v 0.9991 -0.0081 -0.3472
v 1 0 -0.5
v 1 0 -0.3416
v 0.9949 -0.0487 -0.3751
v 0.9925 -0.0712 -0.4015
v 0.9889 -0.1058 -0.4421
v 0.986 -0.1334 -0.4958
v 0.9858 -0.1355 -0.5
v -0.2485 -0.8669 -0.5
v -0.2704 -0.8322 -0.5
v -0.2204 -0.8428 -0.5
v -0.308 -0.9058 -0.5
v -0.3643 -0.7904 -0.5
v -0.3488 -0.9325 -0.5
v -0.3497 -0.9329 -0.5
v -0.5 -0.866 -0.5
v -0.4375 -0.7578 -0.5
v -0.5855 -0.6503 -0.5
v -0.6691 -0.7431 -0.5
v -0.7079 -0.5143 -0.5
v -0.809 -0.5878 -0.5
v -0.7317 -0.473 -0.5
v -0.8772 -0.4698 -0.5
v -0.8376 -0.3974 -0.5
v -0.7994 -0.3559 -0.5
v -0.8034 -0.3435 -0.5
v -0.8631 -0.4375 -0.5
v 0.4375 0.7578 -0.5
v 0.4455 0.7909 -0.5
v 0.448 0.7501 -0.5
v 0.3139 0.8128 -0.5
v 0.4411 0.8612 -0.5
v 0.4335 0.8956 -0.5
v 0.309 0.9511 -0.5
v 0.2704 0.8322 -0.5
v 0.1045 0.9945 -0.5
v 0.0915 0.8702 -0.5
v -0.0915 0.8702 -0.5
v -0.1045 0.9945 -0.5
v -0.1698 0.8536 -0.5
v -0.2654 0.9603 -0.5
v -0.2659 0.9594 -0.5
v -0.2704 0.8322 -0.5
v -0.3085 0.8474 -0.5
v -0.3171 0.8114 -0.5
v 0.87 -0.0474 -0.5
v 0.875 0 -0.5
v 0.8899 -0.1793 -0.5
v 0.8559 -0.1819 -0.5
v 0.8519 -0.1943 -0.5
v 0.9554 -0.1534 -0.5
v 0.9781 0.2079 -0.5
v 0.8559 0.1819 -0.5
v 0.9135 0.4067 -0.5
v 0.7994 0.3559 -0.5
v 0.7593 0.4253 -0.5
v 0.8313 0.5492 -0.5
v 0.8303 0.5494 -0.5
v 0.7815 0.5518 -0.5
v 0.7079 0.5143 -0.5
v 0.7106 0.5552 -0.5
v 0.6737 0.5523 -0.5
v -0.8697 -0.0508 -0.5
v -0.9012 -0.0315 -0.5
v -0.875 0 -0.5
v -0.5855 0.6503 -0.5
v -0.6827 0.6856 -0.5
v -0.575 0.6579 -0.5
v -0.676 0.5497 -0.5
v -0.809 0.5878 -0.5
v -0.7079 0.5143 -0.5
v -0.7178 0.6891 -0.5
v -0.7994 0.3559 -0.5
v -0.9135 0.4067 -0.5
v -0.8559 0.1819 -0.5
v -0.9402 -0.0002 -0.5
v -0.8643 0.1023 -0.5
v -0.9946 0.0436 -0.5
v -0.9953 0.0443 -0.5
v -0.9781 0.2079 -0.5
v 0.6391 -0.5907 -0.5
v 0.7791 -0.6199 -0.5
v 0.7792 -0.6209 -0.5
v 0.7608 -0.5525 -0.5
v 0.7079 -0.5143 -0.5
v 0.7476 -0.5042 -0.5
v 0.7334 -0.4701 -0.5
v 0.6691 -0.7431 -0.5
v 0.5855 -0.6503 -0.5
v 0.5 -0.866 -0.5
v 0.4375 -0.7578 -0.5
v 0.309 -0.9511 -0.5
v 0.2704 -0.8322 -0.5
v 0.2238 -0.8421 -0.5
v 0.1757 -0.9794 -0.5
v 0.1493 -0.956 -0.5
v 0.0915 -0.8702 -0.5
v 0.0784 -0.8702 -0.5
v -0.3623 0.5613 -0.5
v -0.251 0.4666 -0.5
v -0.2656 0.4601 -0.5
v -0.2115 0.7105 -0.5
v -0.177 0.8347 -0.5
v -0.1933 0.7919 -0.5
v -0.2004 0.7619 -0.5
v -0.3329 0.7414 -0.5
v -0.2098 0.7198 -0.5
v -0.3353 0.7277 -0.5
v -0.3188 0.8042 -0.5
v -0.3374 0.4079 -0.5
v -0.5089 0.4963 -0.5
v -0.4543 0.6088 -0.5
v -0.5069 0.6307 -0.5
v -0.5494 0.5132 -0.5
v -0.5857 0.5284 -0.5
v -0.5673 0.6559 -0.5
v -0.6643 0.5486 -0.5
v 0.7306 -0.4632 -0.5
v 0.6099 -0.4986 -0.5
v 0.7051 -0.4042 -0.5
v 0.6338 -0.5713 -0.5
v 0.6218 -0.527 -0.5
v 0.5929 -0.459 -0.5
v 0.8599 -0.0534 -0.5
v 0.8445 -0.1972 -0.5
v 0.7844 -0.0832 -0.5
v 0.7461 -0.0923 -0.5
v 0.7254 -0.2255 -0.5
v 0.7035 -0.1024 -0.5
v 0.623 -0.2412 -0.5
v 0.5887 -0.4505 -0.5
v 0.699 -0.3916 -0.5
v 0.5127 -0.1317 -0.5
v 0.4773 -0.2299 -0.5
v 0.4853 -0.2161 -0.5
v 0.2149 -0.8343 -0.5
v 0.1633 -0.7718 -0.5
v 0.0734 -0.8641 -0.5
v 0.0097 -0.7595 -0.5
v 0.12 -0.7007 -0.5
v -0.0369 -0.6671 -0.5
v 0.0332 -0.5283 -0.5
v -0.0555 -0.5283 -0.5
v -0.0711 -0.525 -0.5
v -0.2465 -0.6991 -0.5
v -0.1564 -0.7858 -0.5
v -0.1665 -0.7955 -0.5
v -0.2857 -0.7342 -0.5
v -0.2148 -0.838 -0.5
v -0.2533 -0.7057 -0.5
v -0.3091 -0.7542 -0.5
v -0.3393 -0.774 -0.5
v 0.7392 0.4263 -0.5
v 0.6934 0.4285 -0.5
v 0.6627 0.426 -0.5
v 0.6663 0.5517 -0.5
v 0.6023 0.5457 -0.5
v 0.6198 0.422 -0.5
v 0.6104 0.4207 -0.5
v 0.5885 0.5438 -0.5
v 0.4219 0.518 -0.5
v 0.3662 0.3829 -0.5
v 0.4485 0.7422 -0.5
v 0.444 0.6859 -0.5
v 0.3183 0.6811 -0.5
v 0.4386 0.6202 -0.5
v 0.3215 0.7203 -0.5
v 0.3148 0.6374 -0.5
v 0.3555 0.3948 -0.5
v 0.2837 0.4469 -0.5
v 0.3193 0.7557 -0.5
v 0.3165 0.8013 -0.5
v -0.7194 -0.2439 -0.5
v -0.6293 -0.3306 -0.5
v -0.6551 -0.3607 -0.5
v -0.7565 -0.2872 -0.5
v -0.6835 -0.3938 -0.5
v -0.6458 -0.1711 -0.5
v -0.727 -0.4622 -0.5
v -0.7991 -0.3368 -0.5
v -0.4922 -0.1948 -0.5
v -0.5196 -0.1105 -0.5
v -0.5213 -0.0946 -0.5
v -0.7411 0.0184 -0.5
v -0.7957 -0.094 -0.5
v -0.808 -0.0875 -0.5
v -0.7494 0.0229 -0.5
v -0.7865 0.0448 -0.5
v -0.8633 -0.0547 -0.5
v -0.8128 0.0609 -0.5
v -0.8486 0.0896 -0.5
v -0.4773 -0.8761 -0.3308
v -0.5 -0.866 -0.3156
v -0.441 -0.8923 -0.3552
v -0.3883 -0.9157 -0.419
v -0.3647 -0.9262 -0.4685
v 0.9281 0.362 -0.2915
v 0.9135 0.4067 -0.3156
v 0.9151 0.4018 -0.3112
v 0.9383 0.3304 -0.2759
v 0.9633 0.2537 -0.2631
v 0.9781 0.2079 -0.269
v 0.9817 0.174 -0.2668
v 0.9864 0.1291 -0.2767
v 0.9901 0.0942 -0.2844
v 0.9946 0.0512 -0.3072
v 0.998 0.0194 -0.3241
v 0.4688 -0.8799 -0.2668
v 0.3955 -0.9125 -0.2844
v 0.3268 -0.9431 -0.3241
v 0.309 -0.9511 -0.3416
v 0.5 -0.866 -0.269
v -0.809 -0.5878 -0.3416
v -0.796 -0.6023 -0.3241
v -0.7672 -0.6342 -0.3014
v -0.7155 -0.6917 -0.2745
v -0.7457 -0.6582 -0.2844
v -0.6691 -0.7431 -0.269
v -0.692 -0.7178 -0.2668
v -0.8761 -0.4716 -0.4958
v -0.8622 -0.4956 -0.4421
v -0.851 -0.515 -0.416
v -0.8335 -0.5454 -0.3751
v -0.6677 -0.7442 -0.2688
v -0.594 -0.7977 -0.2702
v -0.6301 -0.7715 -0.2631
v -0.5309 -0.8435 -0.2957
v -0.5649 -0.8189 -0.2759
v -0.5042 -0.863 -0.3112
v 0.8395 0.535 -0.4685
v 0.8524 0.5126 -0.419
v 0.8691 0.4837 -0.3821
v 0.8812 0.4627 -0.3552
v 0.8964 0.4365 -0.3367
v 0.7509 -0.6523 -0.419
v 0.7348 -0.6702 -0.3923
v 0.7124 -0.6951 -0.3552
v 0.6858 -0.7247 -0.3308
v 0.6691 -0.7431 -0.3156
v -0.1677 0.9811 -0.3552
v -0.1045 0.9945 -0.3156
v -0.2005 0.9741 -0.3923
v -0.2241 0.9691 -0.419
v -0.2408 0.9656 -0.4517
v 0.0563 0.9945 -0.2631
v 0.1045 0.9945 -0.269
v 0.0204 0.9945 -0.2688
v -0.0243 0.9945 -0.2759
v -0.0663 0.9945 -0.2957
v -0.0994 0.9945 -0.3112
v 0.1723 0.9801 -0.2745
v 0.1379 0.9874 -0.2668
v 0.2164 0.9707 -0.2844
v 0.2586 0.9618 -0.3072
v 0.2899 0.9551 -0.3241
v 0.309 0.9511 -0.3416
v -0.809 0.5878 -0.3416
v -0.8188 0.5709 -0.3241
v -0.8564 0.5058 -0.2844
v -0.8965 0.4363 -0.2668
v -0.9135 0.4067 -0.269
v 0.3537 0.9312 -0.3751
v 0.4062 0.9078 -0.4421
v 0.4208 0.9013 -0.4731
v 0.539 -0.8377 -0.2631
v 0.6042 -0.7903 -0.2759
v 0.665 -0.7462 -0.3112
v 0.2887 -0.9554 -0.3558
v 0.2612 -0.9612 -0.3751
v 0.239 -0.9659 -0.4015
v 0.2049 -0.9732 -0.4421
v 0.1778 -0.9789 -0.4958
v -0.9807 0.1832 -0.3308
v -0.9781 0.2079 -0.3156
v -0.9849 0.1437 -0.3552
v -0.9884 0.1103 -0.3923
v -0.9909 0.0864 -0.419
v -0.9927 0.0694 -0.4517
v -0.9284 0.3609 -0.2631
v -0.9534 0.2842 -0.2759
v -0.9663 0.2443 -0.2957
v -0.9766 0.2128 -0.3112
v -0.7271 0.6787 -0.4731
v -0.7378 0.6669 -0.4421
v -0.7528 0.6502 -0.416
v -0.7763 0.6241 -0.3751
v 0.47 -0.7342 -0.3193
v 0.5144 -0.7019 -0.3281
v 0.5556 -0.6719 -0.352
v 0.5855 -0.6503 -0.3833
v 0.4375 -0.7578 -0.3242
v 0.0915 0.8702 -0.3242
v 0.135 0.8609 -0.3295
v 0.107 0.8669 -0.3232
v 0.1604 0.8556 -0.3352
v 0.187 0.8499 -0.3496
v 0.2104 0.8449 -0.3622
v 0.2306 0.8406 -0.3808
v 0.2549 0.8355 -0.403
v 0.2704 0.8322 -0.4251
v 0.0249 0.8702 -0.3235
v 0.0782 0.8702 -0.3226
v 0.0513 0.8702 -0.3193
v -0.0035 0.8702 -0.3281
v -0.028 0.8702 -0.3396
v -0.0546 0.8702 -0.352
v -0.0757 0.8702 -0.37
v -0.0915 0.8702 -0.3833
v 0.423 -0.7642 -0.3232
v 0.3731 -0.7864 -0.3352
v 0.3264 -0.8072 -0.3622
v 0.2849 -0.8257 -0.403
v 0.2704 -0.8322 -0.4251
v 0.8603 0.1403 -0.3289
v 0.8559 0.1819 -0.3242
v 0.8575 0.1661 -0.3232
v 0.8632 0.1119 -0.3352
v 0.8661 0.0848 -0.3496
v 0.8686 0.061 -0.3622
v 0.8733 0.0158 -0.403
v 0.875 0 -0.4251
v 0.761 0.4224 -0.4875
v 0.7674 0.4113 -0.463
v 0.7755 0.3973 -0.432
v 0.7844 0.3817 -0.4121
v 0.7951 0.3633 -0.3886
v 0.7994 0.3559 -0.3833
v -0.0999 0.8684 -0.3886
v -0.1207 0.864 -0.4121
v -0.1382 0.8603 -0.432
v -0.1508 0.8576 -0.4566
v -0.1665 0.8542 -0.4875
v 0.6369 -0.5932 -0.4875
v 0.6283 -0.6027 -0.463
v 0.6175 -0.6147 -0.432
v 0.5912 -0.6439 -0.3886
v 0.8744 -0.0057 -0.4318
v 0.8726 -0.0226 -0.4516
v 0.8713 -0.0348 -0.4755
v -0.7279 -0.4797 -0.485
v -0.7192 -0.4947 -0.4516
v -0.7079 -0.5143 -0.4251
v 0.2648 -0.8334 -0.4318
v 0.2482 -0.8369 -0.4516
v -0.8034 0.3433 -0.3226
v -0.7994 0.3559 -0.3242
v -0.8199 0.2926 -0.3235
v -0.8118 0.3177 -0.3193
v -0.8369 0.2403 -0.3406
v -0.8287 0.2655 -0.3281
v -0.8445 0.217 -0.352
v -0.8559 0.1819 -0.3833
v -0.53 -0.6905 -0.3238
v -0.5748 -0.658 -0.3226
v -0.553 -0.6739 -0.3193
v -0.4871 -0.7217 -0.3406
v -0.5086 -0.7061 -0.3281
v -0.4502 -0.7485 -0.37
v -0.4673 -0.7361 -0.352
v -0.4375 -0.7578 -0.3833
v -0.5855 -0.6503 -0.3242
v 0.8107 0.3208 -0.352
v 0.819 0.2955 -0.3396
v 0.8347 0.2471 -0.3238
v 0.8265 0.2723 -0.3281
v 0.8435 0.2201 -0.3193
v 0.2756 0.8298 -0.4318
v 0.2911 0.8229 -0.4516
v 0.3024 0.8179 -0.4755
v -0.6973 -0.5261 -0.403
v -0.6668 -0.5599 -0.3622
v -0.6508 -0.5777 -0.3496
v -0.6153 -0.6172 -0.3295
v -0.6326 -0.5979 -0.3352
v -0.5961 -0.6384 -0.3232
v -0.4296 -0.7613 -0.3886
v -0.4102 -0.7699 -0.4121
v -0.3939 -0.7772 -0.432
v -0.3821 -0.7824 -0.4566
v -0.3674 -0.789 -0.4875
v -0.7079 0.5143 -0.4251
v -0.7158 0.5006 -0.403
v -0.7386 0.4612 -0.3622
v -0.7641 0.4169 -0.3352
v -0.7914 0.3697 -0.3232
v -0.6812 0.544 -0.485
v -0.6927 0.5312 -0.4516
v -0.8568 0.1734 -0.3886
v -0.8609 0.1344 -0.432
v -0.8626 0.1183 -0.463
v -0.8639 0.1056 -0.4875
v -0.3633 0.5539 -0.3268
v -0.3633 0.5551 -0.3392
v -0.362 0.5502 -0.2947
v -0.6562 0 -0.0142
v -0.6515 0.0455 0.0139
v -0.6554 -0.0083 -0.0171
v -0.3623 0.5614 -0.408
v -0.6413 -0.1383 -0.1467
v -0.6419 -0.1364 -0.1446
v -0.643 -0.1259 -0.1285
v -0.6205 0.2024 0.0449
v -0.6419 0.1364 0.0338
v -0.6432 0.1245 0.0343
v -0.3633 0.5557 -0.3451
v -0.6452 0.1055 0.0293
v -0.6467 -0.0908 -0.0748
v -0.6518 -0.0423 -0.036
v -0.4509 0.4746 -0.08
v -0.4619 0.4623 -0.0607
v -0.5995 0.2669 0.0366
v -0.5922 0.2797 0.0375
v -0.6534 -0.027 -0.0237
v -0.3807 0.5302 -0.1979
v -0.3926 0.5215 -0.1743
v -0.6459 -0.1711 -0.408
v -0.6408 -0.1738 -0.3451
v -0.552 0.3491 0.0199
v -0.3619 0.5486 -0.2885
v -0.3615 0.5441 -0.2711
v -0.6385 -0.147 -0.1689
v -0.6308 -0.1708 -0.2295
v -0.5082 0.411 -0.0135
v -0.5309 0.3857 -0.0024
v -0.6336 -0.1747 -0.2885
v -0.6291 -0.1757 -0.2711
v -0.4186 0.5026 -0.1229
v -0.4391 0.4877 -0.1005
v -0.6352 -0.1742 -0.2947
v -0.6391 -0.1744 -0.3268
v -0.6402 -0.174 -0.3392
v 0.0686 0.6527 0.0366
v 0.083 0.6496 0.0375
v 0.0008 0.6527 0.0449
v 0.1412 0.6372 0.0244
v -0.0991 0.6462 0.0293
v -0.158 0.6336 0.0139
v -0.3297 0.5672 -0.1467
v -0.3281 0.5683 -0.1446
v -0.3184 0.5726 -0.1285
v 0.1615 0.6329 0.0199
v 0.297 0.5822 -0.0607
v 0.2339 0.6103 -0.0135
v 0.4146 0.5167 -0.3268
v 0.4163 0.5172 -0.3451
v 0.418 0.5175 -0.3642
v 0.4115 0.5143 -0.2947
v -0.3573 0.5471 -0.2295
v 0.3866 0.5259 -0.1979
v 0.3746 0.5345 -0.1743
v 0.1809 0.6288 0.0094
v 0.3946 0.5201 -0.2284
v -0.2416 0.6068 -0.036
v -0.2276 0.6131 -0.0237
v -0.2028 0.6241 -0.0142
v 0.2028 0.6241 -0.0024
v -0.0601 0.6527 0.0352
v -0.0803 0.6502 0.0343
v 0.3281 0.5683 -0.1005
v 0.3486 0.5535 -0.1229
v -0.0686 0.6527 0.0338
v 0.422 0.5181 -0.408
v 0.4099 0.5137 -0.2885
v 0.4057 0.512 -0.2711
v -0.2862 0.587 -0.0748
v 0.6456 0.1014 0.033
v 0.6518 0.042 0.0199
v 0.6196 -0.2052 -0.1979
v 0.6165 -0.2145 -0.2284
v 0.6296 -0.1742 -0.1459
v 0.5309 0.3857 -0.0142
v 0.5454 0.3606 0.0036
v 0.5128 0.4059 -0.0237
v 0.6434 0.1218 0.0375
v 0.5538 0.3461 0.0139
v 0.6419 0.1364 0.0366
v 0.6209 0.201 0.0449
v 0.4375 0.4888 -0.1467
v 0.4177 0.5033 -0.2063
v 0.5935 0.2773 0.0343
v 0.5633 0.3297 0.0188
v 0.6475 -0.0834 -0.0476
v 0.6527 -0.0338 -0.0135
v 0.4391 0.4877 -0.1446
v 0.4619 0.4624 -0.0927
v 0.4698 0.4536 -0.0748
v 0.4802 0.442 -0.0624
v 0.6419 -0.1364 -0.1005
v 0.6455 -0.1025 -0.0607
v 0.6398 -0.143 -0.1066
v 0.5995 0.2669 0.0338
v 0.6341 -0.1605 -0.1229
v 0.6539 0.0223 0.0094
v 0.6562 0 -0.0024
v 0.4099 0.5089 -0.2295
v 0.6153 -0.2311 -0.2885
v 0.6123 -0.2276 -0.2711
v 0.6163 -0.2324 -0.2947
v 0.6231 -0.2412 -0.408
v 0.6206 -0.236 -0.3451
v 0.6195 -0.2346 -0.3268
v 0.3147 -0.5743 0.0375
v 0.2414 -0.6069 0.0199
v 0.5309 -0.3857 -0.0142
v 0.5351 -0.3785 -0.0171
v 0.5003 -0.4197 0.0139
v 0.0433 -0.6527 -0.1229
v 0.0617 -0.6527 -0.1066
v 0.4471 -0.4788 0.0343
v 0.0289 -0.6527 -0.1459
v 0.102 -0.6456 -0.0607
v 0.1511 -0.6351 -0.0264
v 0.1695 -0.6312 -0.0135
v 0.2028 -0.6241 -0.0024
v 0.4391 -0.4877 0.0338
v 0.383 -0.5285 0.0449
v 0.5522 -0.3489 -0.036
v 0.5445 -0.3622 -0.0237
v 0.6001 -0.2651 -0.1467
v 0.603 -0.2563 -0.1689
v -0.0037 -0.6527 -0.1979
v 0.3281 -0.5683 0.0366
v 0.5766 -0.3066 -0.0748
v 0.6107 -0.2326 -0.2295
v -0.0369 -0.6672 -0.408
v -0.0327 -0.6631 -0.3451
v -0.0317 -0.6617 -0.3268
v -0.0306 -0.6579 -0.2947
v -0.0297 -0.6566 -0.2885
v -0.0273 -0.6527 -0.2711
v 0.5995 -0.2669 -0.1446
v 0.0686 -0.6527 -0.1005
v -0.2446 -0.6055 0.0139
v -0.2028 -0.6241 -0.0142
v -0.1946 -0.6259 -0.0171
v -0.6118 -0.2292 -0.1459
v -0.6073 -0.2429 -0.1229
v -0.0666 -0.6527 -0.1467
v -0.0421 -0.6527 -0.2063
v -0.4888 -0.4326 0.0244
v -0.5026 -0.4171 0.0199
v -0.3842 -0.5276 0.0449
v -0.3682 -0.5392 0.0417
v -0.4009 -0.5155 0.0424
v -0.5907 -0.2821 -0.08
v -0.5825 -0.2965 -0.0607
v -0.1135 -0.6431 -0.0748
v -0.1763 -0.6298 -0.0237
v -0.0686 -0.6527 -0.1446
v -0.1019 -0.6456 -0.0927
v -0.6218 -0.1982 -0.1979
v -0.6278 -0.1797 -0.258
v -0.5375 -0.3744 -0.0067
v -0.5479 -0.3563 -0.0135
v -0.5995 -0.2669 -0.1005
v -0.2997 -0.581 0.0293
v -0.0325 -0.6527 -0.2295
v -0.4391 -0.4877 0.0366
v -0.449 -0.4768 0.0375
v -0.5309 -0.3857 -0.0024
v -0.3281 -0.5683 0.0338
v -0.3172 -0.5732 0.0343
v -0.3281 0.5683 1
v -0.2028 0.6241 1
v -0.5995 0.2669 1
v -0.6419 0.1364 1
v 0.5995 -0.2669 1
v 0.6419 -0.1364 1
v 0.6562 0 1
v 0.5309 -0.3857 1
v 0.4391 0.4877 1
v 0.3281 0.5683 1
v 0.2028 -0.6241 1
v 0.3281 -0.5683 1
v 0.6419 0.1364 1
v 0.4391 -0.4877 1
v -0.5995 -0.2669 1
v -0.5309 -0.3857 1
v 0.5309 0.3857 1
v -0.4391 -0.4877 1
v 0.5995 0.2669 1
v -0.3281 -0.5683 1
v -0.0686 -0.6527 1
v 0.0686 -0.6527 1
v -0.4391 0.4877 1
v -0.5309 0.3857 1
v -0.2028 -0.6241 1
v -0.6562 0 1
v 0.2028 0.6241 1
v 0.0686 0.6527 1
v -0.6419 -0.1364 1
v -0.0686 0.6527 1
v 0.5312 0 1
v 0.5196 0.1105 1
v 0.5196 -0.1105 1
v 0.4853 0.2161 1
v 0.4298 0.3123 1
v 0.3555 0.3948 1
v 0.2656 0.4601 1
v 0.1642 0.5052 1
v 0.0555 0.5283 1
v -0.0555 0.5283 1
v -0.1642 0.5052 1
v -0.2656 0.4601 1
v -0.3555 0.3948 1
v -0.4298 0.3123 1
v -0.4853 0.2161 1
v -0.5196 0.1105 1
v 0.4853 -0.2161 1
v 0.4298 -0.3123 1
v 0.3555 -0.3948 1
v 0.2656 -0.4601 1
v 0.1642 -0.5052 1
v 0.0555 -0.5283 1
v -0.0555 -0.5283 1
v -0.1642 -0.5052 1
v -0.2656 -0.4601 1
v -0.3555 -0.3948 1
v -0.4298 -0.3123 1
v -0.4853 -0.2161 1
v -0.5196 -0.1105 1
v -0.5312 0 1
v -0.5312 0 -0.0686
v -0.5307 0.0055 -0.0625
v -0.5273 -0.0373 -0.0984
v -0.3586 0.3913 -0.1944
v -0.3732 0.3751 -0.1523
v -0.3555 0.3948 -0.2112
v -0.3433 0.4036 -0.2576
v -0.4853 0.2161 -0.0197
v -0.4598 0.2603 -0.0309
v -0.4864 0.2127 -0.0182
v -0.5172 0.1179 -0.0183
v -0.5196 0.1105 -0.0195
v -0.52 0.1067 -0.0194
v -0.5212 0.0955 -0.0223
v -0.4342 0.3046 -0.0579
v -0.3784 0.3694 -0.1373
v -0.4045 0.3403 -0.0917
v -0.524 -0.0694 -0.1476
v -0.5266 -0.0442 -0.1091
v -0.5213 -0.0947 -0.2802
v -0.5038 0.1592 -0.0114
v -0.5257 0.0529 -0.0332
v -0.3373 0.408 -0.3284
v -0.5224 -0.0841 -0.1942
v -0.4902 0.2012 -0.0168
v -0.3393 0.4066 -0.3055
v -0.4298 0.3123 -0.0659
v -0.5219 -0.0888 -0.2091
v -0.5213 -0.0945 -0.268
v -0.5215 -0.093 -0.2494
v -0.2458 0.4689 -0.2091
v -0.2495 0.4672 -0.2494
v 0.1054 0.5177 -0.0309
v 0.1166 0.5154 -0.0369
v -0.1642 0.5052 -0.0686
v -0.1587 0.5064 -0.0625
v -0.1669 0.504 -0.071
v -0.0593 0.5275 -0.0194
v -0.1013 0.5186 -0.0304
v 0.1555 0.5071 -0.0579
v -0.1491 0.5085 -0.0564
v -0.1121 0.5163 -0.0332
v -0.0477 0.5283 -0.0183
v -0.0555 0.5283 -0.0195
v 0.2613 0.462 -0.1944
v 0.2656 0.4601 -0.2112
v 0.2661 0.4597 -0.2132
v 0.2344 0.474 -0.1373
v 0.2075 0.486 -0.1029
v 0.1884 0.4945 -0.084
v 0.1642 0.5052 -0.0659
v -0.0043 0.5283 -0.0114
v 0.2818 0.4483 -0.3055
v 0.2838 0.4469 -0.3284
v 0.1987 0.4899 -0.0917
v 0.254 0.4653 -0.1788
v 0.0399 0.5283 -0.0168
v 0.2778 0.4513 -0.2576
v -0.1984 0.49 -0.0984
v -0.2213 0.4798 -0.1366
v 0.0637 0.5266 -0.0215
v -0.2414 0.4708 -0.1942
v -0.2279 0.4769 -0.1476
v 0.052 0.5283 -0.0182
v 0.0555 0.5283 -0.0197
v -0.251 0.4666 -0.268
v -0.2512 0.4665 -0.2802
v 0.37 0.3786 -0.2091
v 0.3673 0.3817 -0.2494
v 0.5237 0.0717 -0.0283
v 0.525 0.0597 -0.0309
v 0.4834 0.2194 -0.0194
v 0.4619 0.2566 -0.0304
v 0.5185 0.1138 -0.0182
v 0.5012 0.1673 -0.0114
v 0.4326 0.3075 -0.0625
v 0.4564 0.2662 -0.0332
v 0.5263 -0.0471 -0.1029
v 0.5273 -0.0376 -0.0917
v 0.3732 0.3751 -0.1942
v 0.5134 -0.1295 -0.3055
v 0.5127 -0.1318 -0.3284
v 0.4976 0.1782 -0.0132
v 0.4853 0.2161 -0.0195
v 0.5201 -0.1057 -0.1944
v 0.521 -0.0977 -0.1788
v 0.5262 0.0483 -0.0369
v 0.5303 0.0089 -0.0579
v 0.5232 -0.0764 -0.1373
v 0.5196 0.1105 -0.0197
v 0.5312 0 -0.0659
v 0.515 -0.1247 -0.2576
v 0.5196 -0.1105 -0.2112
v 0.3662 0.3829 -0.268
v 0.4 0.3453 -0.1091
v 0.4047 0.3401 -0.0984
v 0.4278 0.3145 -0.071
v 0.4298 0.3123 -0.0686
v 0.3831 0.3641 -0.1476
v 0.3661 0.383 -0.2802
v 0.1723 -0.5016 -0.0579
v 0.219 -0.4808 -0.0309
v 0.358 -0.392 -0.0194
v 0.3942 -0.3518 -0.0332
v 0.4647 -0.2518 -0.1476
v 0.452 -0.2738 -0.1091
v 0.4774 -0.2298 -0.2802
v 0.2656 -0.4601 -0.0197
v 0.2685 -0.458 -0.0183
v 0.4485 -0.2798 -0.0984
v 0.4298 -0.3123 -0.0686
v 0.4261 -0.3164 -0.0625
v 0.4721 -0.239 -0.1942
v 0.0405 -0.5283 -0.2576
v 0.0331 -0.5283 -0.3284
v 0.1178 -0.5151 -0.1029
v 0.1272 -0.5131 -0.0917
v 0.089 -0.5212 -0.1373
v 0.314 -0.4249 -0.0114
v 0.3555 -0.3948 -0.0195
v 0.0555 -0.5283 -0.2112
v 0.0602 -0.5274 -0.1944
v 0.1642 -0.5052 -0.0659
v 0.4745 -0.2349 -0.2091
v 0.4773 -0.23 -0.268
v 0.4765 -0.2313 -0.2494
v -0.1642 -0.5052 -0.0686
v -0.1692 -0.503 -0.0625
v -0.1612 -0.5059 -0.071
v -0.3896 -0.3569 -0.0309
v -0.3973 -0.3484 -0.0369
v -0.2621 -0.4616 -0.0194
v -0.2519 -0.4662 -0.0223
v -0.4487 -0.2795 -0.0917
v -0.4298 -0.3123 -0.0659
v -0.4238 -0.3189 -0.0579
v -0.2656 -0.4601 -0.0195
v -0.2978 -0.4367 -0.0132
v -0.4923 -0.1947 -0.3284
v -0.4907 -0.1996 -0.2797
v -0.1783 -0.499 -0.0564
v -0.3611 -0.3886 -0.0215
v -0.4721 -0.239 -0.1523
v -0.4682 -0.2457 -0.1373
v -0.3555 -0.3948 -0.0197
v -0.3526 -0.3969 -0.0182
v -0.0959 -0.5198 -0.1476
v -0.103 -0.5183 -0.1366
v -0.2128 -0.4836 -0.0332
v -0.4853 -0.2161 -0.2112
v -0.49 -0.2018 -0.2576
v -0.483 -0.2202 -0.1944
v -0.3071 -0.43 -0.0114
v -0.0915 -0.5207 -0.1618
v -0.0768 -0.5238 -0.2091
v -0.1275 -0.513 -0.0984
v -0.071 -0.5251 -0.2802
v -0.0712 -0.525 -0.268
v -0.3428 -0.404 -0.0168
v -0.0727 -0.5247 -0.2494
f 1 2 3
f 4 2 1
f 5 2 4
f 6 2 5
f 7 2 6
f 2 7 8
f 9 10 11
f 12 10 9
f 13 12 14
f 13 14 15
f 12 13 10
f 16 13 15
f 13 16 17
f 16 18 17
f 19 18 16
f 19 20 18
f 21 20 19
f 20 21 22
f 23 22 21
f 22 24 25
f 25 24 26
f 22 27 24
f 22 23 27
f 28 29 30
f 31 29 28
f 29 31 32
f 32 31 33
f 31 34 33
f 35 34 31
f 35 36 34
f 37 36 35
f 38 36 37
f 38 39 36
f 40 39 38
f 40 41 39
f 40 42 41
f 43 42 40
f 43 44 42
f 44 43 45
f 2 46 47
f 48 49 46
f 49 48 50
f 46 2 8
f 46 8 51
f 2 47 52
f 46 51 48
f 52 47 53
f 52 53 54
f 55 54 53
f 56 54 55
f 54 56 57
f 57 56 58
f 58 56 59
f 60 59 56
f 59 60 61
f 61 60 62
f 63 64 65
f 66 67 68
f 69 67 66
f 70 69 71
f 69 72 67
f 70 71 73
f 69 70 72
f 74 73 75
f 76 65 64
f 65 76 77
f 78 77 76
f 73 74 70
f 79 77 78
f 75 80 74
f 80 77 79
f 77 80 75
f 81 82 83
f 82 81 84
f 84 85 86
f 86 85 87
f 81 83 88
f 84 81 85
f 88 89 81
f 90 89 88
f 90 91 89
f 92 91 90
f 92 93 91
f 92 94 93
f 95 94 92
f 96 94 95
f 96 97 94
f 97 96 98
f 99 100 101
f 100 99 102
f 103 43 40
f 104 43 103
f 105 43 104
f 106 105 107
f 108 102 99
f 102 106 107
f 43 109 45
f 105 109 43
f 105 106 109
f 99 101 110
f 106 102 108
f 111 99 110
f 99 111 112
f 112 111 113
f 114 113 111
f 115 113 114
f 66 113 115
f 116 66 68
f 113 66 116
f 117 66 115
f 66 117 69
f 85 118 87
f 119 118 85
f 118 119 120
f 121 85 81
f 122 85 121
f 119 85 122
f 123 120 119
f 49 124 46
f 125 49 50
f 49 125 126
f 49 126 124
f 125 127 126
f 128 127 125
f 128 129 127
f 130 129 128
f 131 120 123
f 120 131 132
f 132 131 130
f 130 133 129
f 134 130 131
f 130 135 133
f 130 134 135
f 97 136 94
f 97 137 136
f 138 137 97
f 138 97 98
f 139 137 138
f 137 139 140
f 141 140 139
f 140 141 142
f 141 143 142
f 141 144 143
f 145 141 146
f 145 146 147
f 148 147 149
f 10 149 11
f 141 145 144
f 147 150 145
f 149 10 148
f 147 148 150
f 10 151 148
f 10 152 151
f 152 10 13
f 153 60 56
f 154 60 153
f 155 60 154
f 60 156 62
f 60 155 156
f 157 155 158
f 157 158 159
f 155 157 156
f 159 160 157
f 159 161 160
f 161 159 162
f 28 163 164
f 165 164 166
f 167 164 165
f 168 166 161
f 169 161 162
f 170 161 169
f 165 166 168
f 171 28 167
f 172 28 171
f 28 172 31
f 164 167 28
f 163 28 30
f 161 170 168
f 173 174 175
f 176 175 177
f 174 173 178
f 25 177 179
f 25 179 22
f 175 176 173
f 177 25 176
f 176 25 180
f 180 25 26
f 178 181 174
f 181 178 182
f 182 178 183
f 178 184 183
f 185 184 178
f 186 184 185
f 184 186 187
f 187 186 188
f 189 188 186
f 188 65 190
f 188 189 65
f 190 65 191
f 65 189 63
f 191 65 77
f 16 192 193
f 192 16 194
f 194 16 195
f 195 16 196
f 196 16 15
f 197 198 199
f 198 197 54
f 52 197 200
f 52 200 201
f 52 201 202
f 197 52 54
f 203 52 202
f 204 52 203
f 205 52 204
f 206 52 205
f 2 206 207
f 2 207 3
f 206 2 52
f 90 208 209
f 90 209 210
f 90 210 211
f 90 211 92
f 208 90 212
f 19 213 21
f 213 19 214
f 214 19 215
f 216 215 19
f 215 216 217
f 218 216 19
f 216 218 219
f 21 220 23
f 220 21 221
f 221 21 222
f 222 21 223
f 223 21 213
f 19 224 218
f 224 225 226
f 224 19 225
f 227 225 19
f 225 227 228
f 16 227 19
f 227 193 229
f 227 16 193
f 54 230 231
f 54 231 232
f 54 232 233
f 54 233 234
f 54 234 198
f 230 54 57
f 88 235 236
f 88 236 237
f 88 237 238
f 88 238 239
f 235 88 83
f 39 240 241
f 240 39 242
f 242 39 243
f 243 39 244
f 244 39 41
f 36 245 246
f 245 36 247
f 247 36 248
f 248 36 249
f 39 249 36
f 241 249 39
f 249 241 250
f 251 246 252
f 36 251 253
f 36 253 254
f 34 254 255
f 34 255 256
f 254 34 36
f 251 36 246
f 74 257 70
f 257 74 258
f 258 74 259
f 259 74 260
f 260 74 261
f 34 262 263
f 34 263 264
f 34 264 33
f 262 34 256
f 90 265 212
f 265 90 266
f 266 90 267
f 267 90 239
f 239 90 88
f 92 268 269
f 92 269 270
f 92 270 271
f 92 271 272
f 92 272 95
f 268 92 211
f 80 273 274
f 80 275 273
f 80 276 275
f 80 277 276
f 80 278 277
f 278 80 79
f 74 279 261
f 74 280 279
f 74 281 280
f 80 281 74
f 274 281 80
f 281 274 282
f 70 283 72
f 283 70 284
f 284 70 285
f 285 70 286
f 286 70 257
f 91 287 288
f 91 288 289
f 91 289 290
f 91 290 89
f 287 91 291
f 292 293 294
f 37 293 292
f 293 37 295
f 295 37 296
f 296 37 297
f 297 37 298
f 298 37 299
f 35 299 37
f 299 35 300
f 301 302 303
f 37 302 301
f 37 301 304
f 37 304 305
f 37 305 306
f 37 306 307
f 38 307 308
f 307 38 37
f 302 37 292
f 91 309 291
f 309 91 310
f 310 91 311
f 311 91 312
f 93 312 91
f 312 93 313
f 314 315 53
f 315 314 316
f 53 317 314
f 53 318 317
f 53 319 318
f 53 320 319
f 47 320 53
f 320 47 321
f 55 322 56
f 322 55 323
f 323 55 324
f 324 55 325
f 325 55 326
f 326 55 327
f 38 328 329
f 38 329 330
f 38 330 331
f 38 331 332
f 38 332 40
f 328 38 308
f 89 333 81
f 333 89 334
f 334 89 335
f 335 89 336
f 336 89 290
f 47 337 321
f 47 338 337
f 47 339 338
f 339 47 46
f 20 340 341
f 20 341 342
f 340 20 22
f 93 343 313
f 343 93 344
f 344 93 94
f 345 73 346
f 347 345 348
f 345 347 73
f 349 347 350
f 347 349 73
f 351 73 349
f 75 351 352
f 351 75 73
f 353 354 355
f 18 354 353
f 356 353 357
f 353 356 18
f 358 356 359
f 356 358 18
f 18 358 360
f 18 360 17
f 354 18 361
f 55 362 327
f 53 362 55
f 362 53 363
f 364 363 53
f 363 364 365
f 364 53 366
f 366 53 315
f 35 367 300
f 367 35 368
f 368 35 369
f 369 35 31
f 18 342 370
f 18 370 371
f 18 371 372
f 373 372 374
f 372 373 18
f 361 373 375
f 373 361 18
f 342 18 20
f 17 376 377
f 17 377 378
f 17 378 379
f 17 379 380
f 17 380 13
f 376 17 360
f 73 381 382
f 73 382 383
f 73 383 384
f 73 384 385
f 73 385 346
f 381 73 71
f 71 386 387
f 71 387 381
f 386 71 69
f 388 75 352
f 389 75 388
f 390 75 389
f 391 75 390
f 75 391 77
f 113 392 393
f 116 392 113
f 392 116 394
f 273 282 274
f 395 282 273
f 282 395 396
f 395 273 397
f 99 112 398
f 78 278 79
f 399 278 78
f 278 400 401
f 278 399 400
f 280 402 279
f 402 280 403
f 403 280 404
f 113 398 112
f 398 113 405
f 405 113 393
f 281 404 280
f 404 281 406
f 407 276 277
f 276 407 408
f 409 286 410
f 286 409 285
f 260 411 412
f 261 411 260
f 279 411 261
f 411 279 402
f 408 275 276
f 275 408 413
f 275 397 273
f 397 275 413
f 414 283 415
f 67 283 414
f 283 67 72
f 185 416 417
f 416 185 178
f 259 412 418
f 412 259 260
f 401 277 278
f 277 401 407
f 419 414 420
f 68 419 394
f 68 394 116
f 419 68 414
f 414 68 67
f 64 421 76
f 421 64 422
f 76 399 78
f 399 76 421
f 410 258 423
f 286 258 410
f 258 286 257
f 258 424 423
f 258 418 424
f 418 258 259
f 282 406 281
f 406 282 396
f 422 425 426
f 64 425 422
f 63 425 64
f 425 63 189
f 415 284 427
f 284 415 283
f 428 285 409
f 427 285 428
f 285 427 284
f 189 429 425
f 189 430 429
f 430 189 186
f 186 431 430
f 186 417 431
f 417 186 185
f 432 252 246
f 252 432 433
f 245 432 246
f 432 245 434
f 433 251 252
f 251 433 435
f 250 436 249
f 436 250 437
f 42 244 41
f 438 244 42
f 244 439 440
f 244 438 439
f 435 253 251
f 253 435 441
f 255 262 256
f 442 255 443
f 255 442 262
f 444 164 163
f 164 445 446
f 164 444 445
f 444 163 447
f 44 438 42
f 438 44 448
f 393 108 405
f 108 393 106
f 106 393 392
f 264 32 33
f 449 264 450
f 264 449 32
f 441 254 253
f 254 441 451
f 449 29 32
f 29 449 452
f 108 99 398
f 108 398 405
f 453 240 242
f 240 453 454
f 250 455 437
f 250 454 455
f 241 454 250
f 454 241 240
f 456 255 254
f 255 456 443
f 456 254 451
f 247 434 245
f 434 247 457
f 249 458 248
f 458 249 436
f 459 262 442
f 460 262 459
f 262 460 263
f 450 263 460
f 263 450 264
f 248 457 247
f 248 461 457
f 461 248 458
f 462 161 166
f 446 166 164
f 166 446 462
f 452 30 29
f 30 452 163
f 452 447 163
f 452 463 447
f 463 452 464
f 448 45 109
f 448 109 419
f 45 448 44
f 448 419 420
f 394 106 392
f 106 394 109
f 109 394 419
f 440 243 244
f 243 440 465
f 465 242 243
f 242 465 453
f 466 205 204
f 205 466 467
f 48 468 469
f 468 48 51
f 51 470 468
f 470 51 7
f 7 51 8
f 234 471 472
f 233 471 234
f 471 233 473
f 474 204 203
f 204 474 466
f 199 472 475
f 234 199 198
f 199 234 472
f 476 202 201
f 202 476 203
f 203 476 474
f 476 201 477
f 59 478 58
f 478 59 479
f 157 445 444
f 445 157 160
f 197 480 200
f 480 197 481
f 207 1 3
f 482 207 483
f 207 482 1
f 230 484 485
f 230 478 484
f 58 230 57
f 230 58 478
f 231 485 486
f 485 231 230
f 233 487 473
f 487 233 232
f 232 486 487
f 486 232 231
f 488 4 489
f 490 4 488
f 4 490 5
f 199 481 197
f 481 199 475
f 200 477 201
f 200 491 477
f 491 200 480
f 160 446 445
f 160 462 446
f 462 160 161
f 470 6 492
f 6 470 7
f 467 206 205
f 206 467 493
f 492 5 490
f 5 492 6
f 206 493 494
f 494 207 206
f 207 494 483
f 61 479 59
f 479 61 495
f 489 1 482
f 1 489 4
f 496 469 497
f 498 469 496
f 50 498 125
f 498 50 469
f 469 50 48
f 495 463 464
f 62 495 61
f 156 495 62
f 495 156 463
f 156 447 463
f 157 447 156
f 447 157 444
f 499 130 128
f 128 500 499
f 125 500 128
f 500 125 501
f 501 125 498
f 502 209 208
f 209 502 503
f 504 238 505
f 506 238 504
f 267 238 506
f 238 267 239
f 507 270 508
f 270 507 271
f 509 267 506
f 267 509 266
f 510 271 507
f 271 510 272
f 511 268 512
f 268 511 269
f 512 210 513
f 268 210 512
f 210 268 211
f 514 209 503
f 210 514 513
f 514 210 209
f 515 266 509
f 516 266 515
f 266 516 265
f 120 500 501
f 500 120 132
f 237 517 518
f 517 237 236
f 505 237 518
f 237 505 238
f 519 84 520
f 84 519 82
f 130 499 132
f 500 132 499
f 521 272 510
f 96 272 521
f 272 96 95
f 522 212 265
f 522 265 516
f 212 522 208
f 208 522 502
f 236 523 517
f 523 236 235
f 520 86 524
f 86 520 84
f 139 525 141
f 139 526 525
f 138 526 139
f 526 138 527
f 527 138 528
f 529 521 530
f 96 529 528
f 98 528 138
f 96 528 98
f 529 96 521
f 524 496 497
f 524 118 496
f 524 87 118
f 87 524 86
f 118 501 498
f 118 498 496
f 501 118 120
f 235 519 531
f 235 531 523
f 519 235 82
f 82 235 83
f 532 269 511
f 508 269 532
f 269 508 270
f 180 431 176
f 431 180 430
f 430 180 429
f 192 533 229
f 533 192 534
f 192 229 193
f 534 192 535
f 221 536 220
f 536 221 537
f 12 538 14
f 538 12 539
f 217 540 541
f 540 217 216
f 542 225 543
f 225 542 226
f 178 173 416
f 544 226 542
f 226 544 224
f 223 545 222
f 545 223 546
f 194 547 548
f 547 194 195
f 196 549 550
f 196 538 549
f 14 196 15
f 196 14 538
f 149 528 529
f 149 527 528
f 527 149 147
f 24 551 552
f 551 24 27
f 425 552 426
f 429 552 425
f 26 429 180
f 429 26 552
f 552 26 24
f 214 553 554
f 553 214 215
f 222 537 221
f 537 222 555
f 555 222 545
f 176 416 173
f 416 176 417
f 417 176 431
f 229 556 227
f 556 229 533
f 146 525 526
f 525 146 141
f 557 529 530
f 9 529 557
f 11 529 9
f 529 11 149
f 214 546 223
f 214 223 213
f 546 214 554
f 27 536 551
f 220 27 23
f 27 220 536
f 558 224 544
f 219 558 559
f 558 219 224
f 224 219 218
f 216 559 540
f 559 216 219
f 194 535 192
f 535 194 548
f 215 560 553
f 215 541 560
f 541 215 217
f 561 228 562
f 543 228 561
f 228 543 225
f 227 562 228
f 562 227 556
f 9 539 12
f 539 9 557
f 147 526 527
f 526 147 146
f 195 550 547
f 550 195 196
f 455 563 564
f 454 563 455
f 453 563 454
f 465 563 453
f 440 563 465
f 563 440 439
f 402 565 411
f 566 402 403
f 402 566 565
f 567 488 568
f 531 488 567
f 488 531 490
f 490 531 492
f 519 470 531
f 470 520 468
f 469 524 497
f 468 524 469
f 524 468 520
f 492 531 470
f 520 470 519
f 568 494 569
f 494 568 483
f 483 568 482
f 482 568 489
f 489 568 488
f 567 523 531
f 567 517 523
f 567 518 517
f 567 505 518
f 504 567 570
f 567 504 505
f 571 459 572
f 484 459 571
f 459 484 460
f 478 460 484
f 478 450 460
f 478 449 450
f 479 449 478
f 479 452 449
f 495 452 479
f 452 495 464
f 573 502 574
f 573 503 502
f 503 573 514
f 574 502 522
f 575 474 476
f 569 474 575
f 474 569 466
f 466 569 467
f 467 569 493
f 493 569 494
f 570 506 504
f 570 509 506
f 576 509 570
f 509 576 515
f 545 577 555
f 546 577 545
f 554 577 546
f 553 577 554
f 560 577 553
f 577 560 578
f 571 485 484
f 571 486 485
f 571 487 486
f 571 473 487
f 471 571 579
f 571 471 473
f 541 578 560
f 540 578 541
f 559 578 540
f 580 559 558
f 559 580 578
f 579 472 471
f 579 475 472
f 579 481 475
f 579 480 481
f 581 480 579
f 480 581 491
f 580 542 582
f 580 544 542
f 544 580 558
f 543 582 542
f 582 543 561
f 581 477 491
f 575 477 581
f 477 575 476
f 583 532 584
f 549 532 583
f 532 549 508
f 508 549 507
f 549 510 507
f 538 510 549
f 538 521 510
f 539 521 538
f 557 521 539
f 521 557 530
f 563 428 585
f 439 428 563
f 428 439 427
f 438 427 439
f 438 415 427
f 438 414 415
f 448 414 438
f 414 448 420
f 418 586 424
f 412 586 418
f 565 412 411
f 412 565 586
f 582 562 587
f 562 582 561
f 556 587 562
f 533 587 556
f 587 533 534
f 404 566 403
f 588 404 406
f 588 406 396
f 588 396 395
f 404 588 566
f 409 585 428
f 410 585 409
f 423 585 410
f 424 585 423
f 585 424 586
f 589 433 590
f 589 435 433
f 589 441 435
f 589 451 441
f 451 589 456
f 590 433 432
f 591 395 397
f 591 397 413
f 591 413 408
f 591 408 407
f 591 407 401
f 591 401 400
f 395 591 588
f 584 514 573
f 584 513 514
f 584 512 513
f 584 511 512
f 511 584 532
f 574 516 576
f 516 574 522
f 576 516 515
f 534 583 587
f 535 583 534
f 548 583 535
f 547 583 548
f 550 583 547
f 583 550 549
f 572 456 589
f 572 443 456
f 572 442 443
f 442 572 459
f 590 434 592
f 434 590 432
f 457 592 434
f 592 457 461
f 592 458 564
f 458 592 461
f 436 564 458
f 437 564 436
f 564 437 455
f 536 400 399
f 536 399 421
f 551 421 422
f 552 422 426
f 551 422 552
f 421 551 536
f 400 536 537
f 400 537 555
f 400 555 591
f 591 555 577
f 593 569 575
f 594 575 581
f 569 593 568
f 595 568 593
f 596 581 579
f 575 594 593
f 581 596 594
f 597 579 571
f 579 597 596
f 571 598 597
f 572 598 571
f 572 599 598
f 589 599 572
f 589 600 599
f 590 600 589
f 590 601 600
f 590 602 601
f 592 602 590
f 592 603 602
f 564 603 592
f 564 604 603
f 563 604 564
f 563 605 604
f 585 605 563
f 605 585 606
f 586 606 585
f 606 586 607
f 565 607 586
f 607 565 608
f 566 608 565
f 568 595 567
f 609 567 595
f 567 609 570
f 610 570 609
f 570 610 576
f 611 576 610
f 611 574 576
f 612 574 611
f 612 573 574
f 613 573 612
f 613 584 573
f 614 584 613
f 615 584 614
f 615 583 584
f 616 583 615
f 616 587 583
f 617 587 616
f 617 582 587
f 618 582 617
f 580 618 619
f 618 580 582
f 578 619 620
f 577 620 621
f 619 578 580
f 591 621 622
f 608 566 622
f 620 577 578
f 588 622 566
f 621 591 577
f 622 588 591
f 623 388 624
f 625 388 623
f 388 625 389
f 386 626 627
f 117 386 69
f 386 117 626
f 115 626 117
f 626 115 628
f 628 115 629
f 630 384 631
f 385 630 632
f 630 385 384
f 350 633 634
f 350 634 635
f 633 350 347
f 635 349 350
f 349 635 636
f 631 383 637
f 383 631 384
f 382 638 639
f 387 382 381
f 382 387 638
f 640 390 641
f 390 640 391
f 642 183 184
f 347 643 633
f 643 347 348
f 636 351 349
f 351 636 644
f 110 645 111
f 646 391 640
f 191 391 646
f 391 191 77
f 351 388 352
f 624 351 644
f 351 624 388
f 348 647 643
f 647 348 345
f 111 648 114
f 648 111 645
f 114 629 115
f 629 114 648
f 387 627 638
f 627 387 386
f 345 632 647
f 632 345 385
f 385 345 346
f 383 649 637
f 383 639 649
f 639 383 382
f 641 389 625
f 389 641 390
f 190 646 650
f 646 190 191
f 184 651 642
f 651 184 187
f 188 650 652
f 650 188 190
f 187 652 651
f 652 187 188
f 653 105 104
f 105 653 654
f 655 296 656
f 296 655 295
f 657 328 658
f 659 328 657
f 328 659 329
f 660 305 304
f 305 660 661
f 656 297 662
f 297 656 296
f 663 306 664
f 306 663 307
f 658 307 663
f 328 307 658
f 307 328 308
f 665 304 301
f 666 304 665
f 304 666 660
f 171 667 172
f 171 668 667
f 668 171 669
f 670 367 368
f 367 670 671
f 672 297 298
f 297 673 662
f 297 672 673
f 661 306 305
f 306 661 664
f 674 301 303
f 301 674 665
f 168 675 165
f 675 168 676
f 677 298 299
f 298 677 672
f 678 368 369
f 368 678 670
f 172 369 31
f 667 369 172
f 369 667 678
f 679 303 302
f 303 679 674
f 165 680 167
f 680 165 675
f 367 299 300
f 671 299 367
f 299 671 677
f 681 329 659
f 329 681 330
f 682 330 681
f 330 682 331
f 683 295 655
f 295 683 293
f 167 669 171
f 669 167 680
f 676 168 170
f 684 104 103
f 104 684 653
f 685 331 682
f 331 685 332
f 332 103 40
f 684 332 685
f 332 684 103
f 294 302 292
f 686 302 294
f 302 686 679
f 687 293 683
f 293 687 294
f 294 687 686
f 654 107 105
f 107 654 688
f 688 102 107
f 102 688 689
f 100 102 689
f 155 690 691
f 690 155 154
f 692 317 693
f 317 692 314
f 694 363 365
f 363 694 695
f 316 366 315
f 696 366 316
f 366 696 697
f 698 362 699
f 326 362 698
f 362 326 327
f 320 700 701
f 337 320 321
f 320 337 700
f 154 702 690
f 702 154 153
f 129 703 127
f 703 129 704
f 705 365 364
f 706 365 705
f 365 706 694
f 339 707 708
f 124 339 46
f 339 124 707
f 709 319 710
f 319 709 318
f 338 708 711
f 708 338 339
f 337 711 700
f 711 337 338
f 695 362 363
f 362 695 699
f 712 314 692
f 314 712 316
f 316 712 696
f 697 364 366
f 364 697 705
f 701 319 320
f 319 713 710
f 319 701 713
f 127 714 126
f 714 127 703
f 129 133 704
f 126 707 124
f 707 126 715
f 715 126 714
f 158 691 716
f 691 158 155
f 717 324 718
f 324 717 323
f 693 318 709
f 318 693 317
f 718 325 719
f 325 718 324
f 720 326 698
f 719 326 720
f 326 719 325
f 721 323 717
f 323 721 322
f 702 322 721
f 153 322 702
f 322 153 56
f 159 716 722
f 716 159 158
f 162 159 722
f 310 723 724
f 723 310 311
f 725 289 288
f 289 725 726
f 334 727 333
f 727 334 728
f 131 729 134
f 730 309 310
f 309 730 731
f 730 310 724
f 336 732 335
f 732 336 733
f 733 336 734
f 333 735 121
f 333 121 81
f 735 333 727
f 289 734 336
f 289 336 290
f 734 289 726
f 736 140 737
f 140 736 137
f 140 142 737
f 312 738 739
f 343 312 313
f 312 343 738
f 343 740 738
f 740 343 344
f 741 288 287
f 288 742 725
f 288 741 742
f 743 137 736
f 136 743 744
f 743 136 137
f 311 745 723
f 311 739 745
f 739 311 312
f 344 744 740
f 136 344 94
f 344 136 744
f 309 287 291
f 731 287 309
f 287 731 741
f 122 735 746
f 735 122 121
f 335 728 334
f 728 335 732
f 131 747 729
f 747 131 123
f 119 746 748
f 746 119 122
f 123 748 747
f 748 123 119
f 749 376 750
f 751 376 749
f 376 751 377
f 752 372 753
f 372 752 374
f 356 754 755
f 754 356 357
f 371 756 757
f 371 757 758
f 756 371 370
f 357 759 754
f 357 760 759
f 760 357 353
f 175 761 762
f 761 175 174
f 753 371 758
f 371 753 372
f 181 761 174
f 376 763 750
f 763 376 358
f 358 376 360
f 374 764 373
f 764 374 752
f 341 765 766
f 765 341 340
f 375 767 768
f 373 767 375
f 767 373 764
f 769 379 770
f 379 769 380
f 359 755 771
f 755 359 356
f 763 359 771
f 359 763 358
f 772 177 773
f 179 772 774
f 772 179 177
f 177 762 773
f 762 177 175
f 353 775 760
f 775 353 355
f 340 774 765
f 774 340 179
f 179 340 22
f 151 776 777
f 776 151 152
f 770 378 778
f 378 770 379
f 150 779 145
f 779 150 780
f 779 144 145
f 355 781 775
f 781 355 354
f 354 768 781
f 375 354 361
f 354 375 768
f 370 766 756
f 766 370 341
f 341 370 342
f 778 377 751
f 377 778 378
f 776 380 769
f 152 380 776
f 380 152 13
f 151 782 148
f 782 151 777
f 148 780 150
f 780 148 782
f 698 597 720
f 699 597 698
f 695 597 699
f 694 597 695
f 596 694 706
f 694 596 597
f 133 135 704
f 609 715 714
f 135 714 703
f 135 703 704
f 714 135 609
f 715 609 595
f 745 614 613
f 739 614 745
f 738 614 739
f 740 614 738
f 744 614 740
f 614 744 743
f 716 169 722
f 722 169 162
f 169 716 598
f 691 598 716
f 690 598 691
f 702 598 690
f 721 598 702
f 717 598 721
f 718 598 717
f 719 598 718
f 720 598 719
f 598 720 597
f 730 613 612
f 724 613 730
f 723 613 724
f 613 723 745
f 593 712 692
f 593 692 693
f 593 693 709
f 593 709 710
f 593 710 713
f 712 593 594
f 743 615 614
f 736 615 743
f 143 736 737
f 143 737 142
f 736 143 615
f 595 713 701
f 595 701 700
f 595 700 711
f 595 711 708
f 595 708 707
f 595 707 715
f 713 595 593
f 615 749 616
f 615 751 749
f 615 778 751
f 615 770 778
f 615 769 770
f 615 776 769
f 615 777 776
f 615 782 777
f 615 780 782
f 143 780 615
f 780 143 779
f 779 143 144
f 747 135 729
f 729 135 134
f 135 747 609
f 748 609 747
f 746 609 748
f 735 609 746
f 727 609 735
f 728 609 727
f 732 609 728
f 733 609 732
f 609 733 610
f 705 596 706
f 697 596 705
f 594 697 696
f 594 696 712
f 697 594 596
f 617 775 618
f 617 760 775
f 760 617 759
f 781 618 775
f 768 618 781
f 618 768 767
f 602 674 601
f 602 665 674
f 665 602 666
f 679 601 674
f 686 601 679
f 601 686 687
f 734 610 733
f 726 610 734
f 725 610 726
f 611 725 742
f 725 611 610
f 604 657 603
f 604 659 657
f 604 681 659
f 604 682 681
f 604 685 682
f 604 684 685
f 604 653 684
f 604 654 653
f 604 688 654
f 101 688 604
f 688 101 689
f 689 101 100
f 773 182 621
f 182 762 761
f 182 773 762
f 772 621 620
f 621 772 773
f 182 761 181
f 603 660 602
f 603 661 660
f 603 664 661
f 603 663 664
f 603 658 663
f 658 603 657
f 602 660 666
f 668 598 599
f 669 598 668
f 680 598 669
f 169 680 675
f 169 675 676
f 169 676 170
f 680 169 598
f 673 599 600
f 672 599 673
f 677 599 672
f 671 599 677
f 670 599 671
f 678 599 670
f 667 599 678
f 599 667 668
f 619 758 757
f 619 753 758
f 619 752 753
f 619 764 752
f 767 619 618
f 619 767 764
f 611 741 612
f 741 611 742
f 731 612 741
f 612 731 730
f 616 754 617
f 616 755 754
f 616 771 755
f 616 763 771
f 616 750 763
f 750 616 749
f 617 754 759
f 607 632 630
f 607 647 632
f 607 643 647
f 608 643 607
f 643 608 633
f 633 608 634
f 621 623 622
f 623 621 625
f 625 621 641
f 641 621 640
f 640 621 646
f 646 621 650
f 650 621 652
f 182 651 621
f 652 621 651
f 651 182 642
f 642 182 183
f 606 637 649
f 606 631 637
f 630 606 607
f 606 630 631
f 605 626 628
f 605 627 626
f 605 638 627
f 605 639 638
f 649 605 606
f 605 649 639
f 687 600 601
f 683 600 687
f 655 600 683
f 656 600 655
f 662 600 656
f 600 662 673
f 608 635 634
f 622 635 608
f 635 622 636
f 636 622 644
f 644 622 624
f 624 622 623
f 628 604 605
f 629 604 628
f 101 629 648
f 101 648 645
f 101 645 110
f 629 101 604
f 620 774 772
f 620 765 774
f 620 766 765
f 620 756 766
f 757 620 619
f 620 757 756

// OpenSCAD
/*
This part is to make a tapered funnel top for a bell siphon used in hydroponics/aquaponics.

According to http://affnan-aquaponics.blogspot.com the funnel siphon top helps the siphon start at stop at different water flows better.

Inspiration came from the flower shaped spillway at Kechut Reservoir near Jermuk in Armenia.

I am thinking that the flower shape increases the weir surface which may help prevent problems. That and it looks neat.

Parametric, you can set the number of 'petals' and size it to the pipe you are using for a stand pipe. 

Open scad appears to be unitless, so pick a unit for the parameters and stick to it. Your slicing may assume things are in mm, if so, scale by 2540 to get things in inches.

Created by Mike Creuzer - mike@creuzer.com on 2012-08-15
*/



// Cone parameters
petals = 5; // number of 'petals' in the cone
height = .5;
wallthickness = 1/8;
spiralofsset = -wallthickness;  // Not sure if this helps yet. It needs testing to see if the spiral flow will help with siphon start & stops. Make + or - to control the direction of the spin.
maxwidth = 2;

// Standpipe connection
standpipe = 17/16; // 3/4 ID looks to be about 1 1/16 OD 
depth = 1; // How tall you want the neck to be. A taller neck will allow you to have enough overlap that you can tweak the water height.
connectionthickness = 1/8;

// General settings
smoothness = .01; // 2 is the default & is pretty fast, smaller is smoother down to .01



//Render the part
rotate([180,0,0]) // Flip this over for easier printing
{
	union()
	{
			intersection()
			{
				difference()
				{
					cylinder(h = height, r=.5*maxwidth, $fs = smoothness);
					cylinder(h = height, r=.5*maxwidth -wallthickness, $fs = smoothness);
				}
				flowershell(wallthickness);
			}
			difference()
			{
				flower();
				difference()
				{
						cylinder(h = height, r=maxwidth, $fs = smoothness);
						cylinder(h = height, r=.5*maxwidth, $fs = smoothness);
				}
			}
	}
}




module flower()
{
	difference()
	{
		union() 
		{
			flowershell(wallthickness);
			standconnector();
			translate([0,0,-depth]) standconnector();
		}
		union()
		{
			flowershell();
			translate([0,0,height]) cylinder(h=3*height, r=4*height);
			translate([0,0,-depth]) cylinder(h = depth + height, r=.5*standpipe, $fs = smoothness);
		}
	
	}
}




module flowershell(thickness = 0)
{
		for (i = [0 : petals] ) 
		{
			rotate([0, 0 , i*360/petals]) petal(thickness);
		}

}




module petal(wall = 0)
{
		translate([spiralofsset,0,0])
			hull()
			{
				cylinder(h = height, r1 = .25*standpipe+wall, r2 = .25*standpipe+wall, $fs = smoothness);
				rotate([20,-45,0]) cylinder(h = 3*height, r1 = .25*standpipe+wall, r2 = .25*standpipe+wall, $fs = smoothness);
			}
}



module standconnector()
{
		cylinder(h = depth, r=.5*standpipe + connectionthickness, $fs = smoothness);
}
